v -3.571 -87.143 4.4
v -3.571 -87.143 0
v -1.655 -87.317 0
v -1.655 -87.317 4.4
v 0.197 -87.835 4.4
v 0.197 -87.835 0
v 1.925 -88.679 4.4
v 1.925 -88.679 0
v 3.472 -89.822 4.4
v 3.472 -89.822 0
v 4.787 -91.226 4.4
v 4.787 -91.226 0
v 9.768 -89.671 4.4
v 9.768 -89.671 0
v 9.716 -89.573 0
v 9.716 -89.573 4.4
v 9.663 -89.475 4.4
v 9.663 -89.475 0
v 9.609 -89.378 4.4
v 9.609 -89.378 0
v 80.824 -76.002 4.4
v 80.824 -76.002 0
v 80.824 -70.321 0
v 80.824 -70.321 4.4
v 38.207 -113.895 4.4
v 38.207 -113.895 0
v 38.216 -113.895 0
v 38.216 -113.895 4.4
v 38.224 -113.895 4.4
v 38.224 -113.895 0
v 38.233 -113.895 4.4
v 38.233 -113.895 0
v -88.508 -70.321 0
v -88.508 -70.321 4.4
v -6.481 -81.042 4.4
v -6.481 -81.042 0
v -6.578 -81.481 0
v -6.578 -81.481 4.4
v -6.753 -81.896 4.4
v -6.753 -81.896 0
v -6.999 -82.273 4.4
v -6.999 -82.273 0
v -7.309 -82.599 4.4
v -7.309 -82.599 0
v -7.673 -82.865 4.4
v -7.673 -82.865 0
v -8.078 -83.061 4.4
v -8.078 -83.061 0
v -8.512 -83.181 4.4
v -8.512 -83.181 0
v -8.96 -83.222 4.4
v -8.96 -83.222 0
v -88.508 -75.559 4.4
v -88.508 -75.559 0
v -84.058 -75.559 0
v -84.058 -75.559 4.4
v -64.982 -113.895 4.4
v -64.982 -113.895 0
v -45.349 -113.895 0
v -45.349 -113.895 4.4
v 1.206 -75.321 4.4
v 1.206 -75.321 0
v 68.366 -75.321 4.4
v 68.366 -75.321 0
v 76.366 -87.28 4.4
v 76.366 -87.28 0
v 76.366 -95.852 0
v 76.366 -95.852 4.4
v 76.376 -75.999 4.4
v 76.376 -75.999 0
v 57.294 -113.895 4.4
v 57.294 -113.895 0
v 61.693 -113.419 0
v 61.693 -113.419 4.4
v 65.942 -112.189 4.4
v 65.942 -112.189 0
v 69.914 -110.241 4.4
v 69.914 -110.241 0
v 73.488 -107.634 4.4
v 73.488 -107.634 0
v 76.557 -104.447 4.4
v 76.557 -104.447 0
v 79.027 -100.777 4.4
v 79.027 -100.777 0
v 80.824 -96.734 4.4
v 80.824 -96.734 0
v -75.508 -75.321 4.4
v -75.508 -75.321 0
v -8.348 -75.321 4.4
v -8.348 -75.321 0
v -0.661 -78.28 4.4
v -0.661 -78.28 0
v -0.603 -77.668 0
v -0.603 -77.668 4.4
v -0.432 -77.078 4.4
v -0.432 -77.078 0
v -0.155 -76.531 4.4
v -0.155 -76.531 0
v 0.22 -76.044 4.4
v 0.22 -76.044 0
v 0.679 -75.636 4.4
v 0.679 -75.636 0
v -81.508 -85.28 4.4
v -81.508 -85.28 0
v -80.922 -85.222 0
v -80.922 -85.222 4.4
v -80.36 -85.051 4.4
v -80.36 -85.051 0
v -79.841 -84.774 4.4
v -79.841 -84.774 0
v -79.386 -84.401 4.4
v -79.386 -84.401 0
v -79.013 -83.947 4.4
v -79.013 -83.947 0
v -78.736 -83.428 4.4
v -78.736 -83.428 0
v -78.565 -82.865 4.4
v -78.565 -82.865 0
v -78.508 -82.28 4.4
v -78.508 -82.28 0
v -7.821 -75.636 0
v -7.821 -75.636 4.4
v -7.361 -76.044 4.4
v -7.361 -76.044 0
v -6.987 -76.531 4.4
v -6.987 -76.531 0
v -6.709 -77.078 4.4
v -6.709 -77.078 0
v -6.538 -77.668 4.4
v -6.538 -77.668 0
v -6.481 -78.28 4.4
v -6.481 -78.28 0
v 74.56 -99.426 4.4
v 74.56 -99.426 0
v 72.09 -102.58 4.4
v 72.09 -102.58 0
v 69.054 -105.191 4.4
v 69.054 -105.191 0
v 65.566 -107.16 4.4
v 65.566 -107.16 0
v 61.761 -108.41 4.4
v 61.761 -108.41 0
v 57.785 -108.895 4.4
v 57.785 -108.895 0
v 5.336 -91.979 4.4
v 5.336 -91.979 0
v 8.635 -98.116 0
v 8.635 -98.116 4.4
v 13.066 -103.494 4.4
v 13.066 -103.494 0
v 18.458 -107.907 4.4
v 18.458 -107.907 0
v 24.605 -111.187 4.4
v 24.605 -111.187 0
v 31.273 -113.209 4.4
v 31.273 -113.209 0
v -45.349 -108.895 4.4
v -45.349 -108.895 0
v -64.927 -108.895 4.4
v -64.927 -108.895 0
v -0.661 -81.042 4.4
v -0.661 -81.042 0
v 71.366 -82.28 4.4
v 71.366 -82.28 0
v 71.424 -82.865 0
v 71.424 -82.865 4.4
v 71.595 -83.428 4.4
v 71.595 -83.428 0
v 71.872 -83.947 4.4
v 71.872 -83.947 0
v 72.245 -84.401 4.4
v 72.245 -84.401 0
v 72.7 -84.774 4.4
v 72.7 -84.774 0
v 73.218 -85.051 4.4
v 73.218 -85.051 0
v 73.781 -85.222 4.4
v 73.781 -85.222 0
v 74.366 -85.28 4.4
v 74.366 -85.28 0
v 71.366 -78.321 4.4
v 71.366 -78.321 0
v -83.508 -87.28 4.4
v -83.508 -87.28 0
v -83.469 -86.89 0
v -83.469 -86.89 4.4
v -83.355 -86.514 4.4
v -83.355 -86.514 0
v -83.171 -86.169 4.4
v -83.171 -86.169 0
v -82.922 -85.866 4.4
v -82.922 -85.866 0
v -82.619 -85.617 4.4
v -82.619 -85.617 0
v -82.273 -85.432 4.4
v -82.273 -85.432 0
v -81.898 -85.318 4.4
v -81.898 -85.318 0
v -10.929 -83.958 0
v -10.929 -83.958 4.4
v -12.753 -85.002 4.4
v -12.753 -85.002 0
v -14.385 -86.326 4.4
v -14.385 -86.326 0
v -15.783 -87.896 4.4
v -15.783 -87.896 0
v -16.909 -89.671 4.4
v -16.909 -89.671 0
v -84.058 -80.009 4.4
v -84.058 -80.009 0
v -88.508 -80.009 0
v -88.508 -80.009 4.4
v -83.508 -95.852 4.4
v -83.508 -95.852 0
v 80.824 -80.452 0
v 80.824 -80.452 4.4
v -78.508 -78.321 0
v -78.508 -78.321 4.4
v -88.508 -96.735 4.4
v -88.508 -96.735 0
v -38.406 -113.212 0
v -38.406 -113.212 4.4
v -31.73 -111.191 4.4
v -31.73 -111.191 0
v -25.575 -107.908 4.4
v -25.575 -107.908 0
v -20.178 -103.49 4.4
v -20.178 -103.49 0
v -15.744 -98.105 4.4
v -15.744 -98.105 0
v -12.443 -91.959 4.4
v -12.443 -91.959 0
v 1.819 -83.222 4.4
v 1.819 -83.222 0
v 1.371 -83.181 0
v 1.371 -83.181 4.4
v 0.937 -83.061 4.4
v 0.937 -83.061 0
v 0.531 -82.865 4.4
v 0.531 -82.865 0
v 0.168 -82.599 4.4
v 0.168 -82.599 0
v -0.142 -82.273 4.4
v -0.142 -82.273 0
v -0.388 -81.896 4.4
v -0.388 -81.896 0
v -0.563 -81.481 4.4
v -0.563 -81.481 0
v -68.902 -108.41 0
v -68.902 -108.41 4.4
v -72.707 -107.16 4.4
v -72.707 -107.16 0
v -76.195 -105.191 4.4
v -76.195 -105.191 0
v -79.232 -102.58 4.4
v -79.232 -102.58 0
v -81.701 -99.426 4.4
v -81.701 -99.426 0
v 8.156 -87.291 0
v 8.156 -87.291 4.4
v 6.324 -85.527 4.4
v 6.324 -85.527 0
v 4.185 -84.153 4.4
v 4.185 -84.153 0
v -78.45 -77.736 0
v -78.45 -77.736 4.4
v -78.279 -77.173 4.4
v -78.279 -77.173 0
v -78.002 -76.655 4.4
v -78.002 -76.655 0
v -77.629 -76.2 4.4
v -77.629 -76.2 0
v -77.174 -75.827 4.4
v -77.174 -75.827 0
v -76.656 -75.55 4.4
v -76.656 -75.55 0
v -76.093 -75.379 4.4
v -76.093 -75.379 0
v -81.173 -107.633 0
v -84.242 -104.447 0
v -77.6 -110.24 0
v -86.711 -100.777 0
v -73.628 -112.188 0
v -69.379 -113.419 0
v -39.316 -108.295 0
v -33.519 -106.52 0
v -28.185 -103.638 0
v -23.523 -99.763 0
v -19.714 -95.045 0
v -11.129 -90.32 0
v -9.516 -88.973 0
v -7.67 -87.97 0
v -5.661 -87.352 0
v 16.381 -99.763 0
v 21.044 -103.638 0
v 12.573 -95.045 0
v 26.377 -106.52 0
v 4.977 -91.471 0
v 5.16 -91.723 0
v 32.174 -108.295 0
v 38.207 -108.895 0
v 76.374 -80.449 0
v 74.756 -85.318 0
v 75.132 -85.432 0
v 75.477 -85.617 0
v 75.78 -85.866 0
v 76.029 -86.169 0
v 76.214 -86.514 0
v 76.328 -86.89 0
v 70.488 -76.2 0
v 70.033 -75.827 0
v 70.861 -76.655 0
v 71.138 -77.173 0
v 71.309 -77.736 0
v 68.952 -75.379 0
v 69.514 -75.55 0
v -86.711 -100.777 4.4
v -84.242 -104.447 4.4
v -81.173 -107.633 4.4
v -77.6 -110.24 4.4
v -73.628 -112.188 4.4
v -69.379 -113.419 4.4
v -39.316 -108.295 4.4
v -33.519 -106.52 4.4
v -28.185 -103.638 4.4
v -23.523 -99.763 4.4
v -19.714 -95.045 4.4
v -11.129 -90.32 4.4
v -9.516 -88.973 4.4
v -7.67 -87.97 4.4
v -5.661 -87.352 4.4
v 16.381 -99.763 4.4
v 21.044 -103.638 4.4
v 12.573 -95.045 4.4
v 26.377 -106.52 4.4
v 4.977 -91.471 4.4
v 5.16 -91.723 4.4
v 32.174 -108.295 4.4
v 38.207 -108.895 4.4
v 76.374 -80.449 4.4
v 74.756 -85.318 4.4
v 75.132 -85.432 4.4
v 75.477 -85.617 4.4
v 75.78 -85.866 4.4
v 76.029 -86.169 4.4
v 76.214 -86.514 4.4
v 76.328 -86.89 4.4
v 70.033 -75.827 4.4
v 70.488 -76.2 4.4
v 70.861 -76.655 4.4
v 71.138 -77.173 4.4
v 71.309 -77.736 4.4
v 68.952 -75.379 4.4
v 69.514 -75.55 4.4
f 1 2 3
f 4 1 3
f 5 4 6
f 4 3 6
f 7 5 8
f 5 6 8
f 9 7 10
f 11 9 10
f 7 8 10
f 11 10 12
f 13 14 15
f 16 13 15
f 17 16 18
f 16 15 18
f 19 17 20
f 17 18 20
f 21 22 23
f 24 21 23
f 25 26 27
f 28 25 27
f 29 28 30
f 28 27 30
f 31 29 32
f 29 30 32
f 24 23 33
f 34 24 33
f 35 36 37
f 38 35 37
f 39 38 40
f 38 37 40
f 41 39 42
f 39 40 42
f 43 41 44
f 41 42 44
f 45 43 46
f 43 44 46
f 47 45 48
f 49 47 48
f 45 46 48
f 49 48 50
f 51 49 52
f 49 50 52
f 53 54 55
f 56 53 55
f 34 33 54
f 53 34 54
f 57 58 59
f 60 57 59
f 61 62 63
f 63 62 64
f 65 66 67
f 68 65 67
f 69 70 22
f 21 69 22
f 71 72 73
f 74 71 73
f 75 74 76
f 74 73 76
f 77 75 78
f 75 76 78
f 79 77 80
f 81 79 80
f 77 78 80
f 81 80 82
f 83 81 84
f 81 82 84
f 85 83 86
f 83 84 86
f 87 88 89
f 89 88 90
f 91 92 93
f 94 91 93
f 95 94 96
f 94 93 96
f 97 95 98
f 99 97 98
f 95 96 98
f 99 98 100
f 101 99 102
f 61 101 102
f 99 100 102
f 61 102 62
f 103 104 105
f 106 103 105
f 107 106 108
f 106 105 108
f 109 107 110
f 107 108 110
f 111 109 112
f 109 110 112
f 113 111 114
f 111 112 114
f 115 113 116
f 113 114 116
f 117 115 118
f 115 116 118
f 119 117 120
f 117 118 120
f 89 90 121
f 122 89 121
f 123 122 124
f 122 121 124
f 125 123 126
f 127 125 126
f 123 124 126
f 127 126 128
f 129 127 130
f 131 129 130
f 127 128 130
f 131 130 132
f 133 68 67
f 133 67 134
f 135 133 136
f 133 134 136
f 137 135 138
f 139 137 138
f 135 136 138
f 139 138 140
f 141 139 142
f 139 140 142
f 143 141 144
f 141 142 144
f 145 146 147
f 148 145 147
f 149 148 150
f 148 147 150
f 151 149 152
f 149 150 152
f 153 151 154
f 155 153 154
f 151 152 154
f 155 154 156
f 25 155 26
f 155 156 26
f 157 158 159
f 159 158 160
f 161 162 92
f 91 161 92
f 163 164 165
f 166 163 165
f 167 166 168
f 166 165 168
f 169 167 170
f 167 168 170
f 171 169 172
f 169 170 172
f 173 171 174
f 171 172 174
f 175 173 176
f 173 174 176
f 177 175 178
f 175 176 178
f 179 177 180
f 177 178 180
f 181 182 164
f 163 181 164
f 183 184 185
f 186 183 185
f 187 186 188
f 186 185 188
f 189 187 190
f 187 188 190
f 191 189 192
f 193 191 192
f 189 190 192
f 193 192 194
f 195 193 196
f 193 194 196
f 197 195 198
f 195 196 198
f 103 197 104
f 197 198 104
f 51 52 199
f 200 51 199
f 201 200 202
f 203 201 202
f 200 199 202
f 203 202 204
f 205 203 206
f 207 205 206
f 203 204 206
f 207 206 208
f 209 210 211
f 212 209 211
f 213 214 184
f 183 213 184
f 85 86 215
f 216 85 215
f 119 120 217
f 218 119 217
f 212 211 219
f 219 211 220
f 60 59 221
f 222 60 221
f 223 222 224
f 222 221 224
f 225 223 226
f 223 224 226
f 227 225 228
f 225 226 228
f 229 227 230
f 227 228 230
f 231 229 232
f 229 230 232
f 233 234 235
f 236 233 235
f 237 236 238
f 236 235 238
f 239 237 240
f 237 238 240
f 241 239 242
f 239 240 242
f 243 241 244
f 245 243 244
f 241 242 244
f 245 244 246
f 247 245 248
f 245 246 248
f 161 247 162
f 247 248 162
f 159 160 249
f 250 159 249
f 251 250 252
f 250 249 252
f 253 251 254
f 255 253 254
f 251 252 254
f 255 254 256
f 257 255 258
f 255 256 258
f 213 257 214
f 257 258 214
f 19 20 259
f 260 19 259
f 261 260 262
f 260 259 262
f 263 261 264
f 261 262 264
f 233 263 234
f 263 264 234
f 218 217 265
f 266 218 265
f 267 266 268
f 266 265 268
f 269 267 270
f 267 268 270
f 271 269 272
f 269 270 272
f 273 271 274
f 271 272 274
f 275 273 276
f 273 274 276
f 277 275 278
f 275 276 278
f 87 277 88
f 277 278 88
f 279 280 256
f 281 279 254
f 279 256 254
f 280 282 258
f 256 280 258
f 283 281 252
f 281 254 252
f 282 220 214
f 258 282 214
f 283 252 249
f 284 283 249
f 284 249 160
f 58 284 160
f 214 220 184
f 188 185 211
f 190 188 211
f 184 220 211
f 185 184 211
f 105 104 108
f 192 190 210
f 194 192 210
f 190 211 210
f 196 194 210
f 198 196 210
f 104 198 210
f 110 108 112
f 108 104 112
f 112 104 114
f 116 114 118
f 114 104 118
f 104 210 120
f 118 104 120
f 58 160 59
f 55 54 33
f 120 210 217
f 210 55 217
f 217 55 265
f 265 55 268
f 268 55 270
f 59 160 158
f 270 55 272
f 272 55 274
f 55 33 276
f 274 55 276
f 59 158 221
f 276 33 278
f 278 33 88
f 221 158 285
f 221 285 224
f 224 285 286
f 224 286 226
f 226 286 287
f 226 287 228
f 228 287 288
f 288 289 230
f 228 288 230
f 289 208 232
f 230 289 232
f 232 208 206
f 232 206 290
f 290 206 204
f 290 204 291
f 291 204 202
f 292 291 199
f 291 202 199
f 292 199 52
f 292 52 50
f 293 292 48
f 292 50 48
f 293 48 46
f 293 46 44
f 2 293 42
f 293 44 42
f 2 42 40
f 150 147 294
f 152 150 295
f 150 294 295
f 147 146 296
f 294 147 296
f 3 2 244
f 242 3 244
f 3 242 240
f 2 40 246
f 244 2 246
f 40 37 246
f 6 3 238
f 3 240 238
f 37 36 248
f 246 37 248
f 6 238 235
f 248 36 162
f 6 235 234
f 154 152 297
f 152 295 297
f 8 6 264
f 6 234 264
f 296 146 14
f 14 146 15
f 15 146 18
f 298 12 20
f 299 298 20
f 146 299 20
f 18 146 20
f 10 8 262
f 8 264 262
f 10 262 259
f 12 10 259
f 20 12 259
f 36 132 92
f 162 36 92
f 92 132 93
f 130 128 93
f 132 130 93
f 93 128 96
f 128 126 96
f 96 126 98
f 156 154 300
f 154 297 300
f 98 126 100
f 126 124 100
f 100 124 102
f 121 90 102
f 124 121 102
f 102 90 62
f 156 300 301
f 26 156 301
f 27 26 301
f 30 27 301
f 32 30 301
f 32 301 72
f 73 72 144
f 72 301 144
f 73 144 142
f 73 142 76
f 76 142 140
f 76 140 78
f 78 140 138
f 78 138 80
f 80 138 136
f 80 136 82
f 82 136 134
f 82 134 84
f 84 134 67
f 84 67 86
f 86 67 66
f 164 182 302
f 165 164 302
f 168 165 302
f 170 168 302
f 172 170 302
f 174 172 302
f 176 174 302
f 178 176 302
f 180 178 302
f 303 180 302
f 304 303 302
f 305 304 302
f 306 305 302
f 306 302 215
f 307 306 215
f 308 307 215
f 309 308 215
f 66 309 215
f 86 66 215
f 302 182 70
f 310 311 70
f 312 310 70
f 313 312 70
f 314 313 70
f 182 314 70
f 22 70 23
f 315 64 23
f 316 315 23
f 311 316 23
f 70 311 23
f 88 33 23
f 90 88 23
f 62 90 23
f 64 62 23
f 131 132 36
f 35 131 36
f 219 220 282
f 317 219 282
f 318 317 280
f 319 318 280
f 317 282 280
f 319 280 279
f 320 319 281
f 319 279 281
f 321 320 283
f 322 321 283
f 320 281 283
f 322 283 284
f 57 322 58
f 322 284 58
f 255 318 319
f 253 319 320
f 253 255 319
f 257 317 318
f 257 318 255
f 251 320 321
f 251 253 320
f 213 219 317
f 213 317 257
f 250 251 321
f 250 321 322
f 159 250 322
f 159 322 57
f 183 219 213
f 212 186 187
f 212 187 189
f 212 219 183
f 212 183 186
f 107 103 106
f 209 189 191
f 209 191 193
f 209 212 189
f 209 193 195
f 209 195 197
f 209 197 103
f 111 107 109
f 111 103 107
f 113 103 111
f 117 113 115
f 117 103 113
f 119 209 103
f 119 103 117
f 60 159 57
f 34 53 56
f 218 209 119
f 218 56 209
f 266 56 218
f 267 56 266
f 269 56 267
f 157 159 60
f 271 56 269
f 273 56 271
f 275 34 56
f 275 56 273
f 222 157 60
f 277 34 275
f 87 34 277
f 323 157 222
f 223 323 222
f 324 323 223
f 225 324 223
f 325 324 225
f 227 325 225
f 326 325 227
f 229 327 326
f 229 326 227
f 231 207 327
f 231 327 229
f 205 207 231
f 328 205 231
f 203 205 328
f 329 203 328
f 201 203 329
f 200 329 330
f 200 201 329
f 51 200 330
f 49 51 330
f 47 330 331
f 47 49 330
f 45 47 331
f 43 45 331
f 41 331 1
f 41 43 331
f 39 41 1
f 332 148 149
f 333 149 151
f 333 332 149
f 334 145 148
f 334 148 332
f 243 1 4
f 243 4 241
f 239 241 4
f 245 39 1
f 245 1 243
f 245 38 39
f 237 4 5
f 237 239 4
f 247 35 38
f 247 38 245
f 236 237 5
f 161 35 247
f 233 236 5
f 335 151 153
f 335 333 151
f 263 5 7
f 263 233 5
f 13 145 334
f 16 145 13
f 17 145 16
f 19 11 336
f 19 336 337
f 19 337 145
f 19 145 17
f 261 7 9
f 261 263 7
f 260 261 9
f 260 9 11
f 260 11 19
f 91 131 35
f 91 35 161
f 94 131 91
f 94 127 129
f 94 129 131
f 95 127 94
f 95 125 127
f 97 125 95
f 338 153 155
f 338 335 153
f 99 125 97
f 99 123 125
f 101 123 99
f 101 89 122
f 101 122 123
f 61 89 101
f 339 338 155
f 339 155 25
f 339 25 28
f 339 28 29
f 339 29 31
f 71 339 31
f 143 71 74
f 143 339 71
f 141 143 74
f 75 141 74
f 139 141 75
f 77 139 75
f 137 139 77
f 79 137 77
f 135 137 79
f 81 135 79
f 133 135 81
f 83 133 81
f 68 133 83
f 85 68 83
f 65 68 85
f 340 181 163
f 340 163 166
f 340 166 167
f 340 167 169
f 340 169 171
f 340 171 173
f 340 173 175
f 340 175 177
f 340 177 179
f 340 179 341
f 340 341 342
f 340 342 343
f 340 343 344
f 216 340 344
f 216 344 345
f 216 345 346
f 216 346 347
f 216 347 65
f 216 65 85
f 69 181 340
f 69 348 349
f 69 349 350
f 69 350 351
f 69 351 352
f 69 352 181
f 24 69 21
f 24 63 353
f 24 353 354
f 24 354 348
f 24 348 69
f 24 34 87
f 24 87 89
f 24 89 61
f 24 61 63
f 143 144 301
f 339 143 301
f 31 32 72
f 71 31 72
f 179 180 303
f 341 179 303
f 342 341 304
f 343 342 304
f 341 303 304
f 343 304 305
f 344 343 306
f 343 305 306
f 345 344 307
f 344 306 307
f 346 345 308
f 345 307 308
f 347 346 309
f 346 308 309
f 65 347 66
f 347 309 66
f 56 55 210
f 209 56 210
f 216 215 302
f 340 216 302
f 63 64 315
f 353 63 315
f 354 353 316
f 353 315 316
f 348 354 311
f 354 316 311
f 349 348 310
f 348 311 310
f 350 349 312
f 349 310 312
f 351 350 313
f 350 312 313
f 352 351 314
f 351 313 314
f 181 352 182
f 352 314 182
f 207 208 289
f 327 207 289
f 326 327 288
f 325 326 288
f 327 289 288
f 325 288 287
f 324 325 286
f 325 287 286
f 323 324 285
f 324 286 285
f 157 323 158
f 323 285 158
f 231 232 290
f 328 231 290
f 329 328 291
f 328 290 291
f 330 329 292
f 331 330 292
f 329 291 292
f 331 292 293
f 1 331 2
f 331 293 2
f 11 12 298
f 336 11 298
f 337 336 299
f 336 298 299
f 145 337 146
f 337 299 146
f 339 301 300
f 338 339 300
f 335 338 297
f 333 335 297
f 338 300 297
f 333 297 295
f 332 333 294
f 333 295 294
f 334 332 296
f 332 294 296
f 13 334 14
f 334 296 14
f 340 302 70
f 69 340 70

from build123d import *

# Parameters (mm, degrees)
F1_DEPTH = 4.4


with BuildPart() as f1:
    # F0 (on Top) → F1 (new body)
    with BuildSketch(Plane.XY):
        with BuildLine():
            ThreePointArc((-12.44334, -91.95904), (-8.617964, -88.425467), (-3.570689, -87.143026))
            Line((-3.570689, -87.143026), (-3.570689, -70.3213))
            Line((-3.570689, -70.3213), (-82.913134, -70.3213))
            Line((-82.913134, -70.3213), (-88.507661, -70.3213))
            Line((-88.507661, -70.3213), (-88.507661, -75.559488))
            Line((-88.507661, -75.559488), (-84.057661, -75.559488))
            Line((-84.057661, -75.559488), (-84.057661, -80.009488))
            Line((-84.057661, -80.009488), (-88.507661, -80.009488))
            Line((-88.507661, -80.009488), (-88.507661, -96.734692))
            ThreePointArc((-88.507661, -96.734692), (-79.443295, -109.014634), (-64.98152, -113.89488))
            Line((-64.98152, -113.89488), (-45.348551, -113.89488))
            ThreePointArc((-45.348551, -113.89488), (-25.575249, -107.908225), (-12.44334, -91.95904))
        make_face()
        with BuildLine():
            ThreePointArc((-78.507661, -78.3213), (-77.628981, -76.199979), (-75.507661, -75.3213))
            Line((-75.507661, -75.3213), (-8.347679, -75.3213))
            ThreePointArc((-8.347679, -75.3213), (-6.986534, -76.530687), (-6.480797, -78.279848))
            Line((-6.480797, -78.279848), (-6.480797, -81.040353))
            Line((-6.480797, -81.040353), (-6.480797, -81.041593))
            ThreePointArc((-6.480797, -81.041593), (-7.309408, -82.599272), (-8.960268, -83.221863))
            ThreePointArc((-8.960268, -83.221863), (-13.595876, -85.631372), (-16.90926, -89.67069))
            ThreePointArc((-16.90926, -89.67069), (-28.184907, -103.637987), (-45.348551, -108.89488))
            Line((-45.348551, -108.89488), (-64.926874, -108.89488))
            ThreePointArc((-64.926874, -108.89488), (-76.195022, -105.191008), (-83.507661, -95.852104))
            Line((-83.507661, -95.852104), (-83.507661, -87.279848))
            ThreePointArc((-83.507661, -87.279848), (-82.921875, -85.865634), (-81.507661, -85.279848))
            ThreePointArc((-81.507661, -85.279848), (-79.386341, -84.401168), (-78.507661, -82.279848))
            Line((-78.507661, -82.279848), (-78.507661, -78.3213))
        make_face(mode=Mode.SUBTRACT)
        with BuildLine():
            Line((80.823653, -96.734275), (80.823653, -85.451687))
            Line((80.823653, -85.451687), (80.823653, -80.451687))
            Line((80.823653, -80.451687), (76.373653, -80.449196))
            Line((76.373653, -80.449196), (76.376145, -75.999196))
            Line((76.376145, -75.999196), (80.823653, -76.001686))
            Line((80.823653, -76.001686), (80.823653, -75.281577))
            Line((80.823653, -75.281577), (80.823653, -70.3213))
            Line((80.823653, -70.3213), (76.384345, -70.3213))
            Line((76.384345, -70.3213), (75.771756, -70.3213))
            Line((75.771756, -70.3213), (-3.570689, -70.3213))
            Line((-3.570689, -70.3213), (-3.570689, -87.143026))
            ThreePointArc((-3.570689, -87.143026), (1.080367, -88.217483), (4.786777, -91.225688))
            ThreePointArc((4.786777, -91.225688), (5.069545, -91.596309), (5.335725, -91.979017))
            ThreePointArc((5.335725, -91.979017), (18.457726, -107.907175), (38.207173, -113.894871))
            ThreePointArc((38.207173, -113.894871), (38.219889, -113.894877), (38.232605, -113.89488))
            Line((38.232605, -113.89488), (57.294375, -113.89488))
            ThreePointArc((57.294375, -113.89488), (71.758098, -109.01535), (80.823653, -96.734275))
        make_face()
        with BuildLine():
            ThreePointArc((9.767882, -89.67069), (9.689205, -89.523601), (9.608648, -89.377533))
            ThreePointArc((9.608648, -89.377533), (6.324286, -85.527112), (1.818889, -83.221863))
            ThreePointArc((1.818889, -83.221863), (0.16803, -82.599272), (-0.660581, -81.041593))
            Line((-0.660581, -81.041593), (-0.660581, -81.040353))
            Line((-0.660581, -81.040353), (-0.660581, -78.279848))
            ThreePointArc((-0.660581, -78.279848), (-0.154844, -76.530687), (1.206301, -75.3213))
            Line((1.206301, -75.3213), (68.366283, -75.3213))
            ThreePointArc((68.366283, -75.3213), (70.487603, -76.199979), (71.366283, -78.3213))
            Line((71.366283, -78.3213), (71.366283, -82.279848))
            ThreePointArc((71.366283, -82.279848), (72.244962, -84.401168), (74.366283, -85.279848))
            ThreePointArc((74.366283, -85.279848), (75.780496, -85.865634), (76.366283, -87.279848))
            Line((76.366283, -87.279848), (76.366283, -95.852104))
            ThreePointArc((76.366283, -95.852104), (69.053644, -105.191008), (57.785496, -108.89488))
            Line((57.785496, -108.89488), (38.207173, -108.89488))
            ThreePointArc((38.207173, -108.89488), (21.043529, -103.637987), (9.767882, -89.67069))
        make_face(mode=Mode.SUBTRACT)
    extrude(amount=F1_DEPTH)


solid = f1.part
